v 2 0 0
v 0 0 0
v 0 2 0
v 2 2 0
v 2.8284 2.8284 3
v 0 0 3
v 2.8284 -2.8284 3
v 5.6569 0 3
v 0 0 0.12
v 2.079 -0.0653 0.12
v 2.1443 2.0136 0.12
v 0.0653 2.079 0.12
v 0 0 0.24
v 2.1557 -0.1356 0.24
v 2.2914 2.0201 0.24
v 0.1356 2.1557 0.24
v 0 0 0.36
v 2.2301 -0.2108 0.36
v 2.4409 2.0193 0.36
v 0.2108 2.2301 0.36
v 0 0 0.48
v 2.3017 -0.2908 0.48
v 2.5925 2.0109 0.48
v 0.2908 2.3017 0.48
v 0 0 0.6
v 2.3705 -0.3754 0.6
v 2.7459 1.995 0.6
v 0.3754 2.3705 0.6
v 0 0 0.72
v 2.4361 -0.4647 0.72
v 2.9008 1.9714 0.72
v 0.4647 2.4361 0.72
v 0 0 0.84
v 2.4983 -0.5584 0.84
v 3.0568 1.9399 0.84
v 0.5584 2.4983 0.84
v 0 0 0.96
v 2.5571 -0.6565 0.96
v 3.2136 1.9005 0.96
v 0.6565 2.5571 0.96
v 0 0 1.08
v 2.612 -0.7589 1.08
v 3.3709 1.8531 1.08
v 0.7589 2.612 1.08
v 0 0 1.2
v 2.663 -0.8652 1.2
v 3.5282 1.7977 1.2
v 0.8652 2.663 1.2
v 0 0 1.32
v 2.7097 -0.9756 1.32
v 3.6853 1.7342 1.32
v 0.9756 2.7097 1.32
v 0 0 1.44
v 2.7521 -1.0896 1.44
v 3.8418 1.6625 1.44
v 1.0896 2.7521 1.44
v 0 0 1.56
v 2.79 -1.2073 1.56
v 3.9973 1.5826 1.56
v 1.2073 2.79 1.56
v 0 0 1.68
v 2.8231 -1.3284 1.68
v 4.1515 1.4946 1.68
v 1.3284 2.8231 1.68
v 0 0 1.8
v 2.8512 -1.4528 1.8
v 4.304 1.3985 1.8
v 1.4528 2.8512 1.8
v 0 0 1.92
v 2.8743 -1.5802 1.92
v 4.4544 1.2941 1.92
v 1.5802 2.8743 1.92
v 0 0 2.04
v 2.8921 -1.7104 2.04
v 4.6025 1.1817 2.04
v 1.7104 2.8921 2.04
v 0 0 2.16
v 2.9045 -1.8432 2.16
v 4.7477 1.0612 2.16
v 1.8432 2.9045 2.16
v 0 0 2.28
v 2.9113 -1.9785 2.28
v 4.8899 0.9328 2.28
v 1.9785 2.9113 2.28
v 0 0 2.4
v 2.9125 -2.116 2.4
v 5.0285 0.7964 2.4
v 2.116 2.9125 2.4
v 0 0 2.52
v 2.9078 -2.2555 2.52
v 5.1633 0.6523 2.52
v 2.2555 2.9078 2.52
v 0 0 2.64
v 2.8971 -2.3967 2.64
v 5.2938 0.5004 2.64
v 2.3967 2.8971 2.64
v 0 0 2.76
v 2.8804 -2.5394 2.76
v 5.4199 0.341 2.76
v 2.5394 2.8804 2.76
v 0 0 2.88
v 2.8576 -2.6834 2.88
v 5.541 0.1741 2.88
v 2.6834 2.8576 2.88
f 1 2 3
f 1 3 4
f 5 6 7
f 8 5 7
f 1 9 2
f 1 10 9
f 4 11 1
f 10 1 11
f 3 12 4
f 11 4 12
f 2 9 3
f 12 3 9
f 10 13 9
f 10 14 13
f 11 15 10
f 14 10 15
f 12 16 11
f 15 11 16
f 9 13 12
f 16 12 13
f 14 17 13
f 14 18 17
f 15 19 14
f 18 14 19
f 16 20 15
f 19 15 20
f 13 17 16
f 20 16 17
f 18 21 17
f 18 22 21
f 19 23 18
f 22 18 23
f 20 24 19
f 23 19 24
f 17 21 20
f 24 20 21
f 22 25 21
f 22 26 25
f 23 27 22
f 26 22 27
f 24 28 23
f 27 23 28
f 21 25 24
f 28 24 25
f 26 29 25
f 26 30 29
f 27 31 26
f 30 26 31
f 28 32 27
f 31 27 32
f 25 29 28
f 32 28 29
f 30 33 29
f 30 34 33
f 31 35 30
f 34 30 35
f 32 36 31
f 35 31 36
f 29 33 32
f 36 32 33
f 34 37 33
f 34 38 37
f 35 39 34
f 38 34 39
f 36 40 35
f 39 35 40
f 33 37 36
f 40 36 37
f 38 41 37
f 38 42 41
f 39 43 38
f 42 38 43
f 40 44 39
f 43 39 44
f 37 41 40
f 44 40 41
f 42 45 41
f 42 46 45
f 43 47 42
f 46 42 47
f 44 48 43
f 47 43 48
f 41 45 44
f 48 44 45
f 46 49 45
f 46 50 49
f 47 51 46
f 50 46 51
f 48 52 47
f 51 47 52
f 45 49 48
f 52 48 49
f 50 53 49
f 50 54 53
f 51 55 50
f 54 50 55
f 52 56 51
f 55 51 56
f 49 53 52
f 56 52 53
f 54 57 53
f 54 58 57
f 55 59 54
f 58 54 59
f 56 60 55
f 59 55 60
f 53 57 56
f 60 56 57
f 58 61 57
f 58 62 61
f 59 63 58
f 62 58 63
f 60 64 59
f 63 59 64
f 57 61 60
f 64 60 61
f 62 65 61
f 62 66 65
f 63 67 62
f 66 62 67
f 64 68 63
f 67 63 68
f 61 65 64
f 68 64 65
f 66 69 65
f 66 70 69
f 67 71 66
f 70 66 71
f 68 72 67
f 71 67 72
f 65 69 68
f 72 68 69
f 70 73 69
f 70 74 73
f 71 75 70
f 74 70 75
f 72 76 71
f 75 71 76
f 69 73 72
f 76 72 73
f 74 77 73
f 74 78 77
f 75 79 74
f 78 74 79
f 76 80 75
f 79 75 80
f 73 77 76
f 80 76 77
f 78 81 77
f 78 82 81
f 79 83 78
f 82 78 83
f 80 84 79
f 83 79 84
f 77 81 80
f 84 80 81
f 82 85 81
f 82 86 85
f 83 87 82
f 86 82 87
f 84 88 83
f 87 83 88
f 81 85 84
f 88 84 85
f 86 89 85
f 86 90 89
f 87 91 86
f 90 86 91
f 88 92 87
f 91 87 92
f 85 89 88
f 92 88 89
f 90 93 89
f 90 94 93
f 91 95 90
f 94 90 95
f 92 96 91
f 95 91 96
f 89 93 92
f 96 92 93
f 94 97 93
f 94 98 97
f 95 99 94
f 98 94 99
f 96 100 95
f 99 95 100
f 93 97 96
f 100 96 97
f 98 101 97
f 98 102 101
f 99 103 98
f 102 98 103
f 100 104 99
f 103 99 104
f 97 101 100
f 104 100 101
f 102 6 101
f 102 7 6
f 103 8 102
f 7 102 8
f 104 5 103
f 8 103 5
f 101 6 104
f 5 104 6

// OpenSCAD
$fn=200;
linear_extrude(height=3, twist=45, scale=2.0)
square(size=[2, 2]);
